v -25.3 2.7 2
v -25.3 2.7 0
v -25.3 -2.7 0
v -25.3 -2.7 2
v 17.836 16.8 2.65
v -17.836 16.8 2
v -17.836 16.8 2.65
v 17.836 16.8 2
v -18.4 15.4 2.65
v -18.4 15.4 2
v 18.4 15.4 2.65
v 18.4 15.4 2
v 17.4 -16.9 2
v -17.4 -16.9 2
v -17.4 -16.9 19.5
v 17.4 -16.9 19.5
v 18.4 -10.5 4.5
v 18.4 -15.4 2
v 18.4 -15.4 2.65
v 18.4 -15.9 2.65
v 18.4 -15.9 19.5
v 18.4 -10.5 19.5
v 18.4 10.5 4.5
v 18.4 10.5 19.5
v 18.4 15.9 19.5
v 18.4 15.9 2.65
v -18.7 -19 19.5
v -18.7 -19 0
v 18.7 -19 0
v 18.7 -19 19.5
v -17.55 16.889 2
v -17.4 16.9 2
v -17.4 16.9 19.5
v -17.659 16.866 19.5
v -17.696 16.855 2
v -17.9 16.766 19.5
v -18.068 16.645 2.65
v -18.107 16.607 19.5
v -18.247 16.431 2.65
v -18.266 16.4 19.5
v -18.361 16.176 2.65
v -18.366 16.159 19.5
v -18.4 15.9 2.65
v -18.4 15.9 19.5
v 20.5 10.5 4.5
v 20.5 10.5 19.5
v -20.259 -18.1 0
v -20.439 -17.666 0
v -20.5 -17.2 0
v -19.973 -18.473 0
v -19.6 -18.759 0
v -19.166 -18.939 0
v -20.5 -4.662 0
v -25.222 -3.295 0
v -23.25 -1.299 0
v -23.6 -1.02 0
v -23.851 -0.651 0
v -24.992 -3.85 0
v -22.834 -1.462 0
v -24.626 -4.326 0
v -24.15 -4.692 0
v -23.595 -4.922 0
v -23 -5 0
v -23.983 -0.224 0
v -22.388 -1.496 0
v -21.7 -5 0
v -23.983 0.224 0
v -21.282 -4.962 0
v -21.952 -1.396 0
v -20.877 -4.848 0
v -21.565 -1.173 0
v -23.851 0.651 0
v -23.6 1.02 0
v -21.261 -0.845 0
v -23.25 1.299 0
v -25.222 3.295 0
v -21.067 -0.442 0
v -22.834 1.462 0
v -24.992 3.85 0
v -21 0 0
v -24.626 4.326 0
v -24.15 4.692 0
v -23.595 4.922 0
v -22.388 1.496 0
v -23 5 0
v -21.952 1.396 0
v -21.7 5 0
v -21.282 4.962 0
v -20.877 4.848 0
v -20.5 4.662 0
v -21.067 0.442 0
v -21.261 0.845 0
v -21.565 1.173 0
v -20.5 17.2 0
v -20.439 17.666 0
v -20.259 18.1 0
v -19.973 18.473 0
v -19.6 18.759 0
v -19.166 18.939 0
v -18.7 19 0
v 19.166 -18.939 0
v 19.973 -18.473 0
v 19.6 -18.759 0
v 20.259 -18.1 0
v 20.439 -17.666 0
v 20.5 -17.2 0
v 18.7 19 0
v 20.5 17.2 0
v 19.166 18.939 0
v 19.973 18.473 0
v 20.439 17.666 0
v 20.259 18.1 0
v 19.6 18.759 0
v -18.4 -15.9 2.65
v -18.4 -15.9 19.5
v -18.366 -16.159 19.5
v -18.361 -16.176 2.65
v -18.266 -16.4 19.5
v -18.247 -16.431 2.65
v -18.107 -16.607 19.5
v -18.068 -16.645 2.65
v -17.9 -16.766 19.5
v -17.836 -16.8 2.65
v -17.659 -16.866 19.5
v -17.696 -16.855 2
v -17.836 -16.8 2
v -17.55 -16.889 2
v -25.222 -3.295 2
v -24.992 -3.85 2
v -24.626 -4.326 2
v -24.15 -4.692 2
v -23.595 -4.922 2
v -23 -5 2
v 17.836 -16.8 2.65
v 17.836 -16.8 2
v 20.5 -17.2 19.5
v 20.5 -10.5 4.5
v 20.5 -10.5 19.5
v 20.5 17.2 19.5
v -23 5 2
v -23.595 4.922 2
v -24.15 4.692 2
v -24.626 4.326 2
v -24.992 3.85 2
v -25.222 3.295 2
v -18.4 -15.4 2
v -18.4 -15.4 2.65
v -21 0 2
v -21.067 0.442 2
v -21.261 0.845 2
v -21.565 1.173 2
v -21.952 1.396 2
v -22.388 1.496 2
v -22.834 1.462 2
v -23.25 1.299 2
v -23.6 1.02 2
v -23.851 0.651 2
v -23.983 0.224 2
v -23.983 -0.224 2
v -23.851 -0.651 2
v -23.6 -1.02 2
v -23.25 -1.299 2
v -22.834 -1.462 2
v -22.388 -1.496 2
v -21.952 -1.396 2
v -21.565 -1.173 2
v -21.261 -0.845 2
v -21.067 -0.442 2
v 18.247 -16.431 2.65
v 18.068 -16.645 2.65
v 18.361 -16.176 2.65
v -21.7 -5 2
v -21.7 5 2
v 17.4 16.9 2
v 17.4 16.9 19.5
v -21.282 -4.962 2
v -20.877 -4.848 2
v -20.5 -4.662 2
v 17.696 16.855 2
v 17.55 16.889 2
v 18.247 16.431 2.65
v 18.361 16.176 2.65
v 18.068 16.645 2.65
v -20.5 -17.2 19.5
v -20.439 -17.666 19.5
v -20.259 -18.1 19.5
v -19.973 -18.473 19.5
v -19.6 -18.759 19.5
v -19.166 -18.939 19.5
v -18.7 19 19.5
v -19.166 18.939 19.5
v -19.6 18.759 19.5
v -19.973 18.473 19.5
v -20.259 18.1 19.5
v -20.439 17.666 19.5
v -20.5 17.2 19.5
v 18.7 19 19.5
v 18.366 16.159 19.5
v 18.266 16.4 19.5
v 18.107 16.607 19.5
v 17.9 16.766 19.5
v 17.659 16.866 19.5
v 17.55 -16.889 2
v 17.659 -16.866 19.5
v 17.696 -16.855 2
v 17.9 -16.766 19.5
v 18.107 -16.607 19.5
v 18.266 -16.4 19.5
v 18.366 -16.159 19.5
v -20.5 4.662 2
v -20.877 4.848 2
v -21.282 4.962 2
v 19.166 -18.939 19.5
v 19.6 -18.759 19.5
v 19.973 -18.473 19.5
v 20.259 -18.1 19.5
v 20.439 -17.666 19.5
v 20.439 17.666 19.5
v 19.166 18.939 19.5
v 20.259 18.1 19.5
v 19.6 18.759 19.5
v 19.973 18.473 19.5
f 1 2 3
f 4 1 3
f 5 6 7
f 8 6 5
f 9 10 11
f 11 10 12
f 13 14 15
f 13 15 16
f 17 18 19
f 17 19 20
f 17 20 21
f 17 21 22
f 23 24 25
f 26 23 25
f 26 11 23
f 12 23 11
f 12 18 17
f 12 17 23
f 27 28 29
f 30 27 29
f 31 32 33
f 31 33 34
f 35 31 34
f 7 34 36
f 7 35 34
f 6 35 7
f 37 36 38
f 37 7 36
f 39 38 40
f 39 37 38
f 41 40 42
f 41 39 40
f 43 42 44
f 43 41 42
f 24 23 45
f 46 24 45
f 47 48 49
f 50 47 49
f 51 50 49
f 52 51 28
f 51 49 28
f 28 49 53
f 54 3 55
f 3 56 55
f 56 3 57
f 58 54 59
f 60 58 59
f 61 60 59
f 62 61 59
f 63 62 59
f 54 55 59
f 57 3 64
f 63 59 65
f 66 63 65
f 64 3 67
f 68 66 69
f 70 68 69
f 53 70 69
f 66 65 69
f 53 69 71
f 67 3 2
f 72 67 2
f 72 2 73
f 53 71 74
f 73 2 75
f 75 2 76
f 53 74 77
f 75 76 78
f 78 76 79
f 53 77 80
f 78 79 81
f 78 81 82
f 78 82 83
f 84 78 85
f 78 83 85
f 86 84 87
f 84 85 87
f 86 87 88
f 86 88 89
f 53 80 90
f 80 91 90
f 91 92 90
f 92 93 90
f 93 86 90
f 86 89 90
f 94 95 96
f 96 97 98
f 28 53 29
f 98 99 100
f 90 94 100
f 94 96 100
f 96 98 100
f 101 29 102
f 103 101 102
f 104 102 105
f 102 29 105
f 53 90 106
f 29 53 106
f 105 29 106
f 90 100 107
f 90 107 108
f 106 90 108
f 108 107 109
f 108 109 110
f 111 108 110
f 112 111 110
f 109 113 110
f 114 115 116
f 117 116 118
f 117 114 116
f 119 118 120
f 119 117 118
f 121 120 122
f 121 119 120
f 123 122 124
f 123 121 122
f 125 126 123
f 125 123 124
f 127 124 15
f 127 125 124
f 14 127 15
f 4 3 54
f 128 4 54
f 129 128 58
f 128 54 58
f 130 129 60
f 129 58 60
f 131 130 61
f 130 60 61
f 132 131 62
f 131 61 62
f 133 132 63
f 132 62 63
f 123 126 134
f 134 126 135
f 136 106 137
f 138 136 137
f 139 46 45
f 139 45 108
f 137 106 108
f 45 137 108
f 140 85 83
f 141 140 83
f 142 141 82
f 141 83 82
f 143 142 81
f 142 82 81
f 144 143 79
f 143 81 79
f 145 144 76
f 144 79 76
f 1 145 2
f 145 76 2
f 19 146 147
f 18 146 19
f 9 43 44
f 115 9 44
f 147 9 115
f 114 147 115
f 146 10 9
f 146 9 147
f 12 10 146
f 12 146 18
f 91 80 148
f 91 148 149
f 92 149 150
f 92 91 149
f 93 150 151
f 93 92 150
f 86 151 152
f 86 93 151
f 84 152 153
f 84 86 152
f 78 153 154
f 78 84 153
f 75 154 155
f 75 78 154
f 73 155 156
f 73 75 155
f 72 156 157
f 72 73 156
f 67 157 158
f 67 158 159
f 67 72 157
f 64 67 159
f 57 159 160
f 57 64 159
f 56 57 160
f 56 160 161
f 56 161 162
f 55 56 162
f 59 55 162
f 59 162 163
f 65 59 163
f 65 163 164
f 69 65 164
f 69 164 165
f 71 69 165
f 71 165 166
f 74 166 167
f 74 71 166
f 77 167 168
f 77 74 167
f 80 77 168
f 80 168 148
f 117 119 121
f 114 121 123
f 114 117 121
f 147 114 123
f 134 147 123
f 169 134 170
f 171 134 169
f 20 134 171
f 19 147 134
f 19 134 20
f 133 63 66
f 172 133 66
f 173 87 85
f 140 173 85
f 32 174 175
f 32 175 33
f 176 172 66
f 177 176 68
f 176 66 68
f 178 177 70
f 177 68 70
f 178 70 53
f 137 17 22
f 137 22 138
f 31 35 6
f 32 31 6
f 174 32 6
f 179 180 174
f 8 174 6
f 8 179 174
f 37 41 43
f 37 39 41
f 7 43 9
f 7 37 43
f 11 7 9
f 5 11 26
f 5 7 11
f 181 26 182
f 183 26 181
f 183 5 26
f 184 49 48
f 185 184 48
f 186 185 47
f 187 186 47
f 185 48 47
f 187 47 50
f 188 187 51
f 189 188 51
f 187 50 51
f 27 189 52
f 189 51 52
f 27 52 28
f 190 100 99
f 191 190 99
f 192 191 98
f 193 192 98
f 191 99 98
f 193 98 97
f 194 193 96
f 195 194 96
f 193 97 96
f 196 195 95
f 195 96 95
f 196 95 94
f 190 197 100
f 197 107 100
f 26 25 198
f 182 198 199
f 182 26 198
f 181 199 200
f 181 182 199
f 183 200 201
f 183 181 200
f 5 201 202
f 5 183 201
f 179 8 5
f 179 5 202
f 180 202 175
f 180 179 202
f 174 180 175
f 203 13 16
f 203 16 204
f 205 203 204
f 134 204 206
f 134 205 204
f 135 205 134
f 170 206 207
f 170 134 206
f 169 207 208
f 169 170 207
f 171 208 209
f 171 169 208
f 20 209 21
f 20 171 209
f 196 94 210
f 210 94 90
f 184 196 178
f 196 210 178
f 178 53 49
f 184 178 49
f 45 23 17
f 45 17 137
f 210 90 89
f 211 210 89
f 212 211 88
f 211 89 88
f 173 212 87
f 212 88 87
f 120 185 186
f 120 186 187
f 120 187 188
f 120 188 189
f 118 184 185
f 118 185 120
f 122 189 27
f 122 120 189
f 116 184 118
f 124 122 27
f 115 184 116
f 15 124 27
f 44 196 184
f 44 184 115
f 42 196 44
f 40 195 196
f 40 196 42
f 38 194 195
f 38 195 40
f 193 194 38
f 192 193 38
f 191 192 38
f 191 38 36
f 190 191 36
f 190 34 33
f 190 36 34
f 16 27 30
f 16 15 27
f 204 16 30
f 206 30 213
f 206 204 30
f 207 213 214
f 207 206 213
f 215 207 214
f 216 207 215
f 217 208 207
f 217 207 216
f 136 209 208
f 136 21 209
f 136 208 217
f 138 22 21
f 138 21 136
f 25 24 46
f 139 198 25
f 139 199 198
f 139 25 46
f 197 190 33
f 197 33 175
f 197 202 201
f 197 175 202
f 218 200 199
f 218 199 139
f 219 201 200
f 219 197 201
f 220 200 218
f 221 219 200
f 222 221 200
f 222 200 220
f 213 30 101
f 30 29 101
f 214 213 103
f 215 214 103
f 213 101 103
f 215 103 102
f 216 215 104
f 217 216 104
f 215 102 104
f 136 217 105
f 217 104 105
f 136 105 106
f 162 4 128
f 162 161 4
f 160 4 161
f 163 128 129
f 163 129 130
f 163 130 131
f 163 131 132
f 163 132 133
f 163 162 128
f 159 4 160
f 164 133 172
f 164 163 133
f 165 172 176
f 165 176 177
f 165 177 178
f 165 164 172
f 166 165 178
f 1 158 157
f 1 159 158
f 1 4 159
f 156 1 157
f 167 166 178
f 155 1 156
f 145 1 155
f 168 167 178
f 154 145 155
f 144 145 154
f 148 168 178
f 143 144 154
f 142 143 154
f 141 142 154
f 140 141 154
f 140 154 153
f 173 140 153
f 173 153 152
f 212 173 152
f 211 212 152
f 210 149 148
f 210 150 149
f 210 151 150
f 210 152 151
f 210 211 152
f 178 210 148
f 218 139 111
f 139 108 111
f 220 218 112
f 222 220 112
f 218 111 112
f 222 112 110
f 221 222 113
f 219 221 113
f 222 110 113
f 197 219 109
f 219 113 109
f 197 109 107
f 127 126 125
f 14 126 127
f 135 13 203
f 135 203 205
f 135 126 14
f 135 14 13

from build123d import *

# Parameters (mm, degrees)
FACTORY_ABS_FLOOR_41X38_DEPTH       = 2
FACTORY_ABS_SIDEWALLS_START         = 2
FACTORY_ABS_SIDEWALLS_DEPTH         = 17.5
FACTORY_TERMINAL_OPENING_START      = 4.5
FACTORY_TERMINAL_OPENING_SKETCH_W   = 3.2
FACTORY_TERMINAL_OPENING_SKETCH_H   = 21
FACTORY_TERMINAL_OPENING_DEPTH      = 15
FACTORY_MOUNTING_EAR_DEPTH          = 2
FACTORY_EAR_REFERENCE_HOLE_SKETCH_R = 1.5
FACTORY_EAR_REFERENCE_HOLE_DEPTH    = 2
PCB_SUPPORT_LEDGES_START            = 2
PCB_SUPPORT_LEDGES_SKETCH_W         = 36.9
PCB_SUPPORT_LEDGES_SKETCH_H         = 1.4
PCB_SUPPORT_LEDGES_DEPTH            = 0.65


with BuildPart() as part:
    # Factory_ABS_floor_41x38_Sketch → Factory_ABS_floor_41x38 (new body)
    with BuildSketch(Plane.XY):
        with BuildLine():
            Line((-18.7, -19), (18.7, -19))
            ThreePointArc((18.7, -19), (19.972792206, -18.472792206), (20.5, -17.2))
            Line((20.5, -17.2), (20.5, 17.2))
            ThreePointArc((20.5, 17.2), (19.972792206, 18.472792206), (18.7, 19))
            Line((18.7, 19), (-18.7, 19))
            ThreePointArc((-18.7, 19), (-19.972792206, 18.472792206), (-20.5, 17.2))
            Line((-20.5, 17.2), (-20.5, -17.2))
            ThreePointArc((-20.5, -17.2), (-19.972792206, -18.472792206), (-18.7, -19))
        make_face()
    extrude(amount=FACTORY_ABS_FLOOR_41X38_DEPTH)

    # Factory_ABS_sidewalls_Sketch → Factory_ABS_sidewalls (add)
    with BuildSketch(Plane.XY.offset(FACTORY_ABS_SIDEWALLS_START)):
        with BuildLine():
            Line((-18.7, -19), (18.7, -19))
            ThreePointArc((18.7, -19), (19.972792206, -18.472792206), (20.5, -17.2))
            Line((20.5, -17.2), (20.5, 17.2))
            ThreePointArc((20.5, 17.2), (19.972792206, 18.472792206), (18.7, 19))
            Line((18.7, 19), (-18.7, 19))
            ThreePointArc((-18.7, 19), (-19.972792206, 18.472792206), (-20.5, 17.2))
            Line((-20.5, 17.2), (-20.5, -17.2))
            ThreePointArc((-20.5, -17.2), (-19.972792206, -18.472792206), (-18.7, -19))
        make_face()
        with BuildLine():
            Line((-17.4, -16.9), (17.4, -16.9))
            ThreePointArc((17.4, -16.9), (18.107106781, -16.607106781), (18.4, -15.9))
            Line((18.4, -15.9), (18.4, 15.9))
            ThreePointArc((18.4, 15.9), (18.107106781, 16.607106781), (17.4, 16.9))
            Line((17.4, 16.9), (-17.4, 16.9))
            ThreePointArc((-17.4, 16.9), (-18.107106781, 16.607106781), (-18.4, 15.9))
            Line((-18.4, 15.9), (-18.4, -15.9))
            ThreePointArc((-18.4, -15.9), (-18.107106781, -16.607106781), (-17.4, -16.9))
        make_face(mode=Mode.SUBTRACT)
    extrude(amount=FACTORY_ABS_SIDEWALLS_DEPTH)

    # Factory_terminal_opening_Sketch → Factory_terminal_opening (cut)
    with BuildSketch(Plane.XY.offset(FACTORY_TERMINAL_OPENING_START)):
        with Locations((19.8, 0)):
            Rectangle(FACTORY_TERMINAL_OPENING_SKETCH_W, FACTORY_TERMINAL_OPENING_SKETCH_H)
    extrude(amount=FACTORY_TERMINAL_OPENING_DEPTH, mode=Mode.SUBTRACT)

    # Factory_mounting_ear_Sketch → Factory_mounting_ear (add)
    with BuildSketch(Plane.XY):
        with BuildLine():
            Line((-23, -5), (-21.7, -5))
            ThreePointArc((-21.7, -5), (-20.073654403, -4.326345597), (-19.4, -2.7))
            Line((-19.4, -2.7), (-19.4, 2.7))
            ThreePointArc((-19.4, 2.7), (-20.073654403, 4.326345597), (-21.7, 5))
            Line((-21.7, 5), (-23, 5))
            ThreePointArc((-23, 5), (-24.626345597, 4.326345597), (-25.3, 2.7))
            Line((-25.3, 2.7), (-25.3, -2.7))
            ThreePointArc((-25.3, -2.7), (-24.626345597, -4.326345597), (-23, -5))
        make_face()
    extrude(amount=FACTORY_MOUNTING_EAR_DEPTH)

    # Factory_ear_reference_hole_Sketch → Factory_ear_reference_hole (cut)
    with BuildSketch(Plane.XY):
        with Locations((-22.5, 0)):
            Circle(FACTORY_EAR_REFERENCE_HOLE_SKETCH_R)
    extrude(amount=FACTORY_EAR_REFERENCE_HOLE_DEPTH, mode=Mode.SUBTRACT)

    # PCB_support_ledges_Sketch → PCB_support_ledges (add)
    with BuildSketch(Plane.XY.offset(PCB_SUPPORT_LEDGES_START)):
        with Locations((0, -16.1)):
            Rectangle(PCB_SUPPORT_LEDGES_SKETCH_W, PCB_SUPPORT_LEDGES_SKETCH_H)
        with Locations((0, 16.1)):
            Rectangle(PCB_SUPPORT_LEDGES_SKETCH_W, PCB_SUPPORT_LEDGES_SKETCH_H)
    extrude(amount=PCB_SUPPORT_LEDGES_DEPTH)


solid = part.part
